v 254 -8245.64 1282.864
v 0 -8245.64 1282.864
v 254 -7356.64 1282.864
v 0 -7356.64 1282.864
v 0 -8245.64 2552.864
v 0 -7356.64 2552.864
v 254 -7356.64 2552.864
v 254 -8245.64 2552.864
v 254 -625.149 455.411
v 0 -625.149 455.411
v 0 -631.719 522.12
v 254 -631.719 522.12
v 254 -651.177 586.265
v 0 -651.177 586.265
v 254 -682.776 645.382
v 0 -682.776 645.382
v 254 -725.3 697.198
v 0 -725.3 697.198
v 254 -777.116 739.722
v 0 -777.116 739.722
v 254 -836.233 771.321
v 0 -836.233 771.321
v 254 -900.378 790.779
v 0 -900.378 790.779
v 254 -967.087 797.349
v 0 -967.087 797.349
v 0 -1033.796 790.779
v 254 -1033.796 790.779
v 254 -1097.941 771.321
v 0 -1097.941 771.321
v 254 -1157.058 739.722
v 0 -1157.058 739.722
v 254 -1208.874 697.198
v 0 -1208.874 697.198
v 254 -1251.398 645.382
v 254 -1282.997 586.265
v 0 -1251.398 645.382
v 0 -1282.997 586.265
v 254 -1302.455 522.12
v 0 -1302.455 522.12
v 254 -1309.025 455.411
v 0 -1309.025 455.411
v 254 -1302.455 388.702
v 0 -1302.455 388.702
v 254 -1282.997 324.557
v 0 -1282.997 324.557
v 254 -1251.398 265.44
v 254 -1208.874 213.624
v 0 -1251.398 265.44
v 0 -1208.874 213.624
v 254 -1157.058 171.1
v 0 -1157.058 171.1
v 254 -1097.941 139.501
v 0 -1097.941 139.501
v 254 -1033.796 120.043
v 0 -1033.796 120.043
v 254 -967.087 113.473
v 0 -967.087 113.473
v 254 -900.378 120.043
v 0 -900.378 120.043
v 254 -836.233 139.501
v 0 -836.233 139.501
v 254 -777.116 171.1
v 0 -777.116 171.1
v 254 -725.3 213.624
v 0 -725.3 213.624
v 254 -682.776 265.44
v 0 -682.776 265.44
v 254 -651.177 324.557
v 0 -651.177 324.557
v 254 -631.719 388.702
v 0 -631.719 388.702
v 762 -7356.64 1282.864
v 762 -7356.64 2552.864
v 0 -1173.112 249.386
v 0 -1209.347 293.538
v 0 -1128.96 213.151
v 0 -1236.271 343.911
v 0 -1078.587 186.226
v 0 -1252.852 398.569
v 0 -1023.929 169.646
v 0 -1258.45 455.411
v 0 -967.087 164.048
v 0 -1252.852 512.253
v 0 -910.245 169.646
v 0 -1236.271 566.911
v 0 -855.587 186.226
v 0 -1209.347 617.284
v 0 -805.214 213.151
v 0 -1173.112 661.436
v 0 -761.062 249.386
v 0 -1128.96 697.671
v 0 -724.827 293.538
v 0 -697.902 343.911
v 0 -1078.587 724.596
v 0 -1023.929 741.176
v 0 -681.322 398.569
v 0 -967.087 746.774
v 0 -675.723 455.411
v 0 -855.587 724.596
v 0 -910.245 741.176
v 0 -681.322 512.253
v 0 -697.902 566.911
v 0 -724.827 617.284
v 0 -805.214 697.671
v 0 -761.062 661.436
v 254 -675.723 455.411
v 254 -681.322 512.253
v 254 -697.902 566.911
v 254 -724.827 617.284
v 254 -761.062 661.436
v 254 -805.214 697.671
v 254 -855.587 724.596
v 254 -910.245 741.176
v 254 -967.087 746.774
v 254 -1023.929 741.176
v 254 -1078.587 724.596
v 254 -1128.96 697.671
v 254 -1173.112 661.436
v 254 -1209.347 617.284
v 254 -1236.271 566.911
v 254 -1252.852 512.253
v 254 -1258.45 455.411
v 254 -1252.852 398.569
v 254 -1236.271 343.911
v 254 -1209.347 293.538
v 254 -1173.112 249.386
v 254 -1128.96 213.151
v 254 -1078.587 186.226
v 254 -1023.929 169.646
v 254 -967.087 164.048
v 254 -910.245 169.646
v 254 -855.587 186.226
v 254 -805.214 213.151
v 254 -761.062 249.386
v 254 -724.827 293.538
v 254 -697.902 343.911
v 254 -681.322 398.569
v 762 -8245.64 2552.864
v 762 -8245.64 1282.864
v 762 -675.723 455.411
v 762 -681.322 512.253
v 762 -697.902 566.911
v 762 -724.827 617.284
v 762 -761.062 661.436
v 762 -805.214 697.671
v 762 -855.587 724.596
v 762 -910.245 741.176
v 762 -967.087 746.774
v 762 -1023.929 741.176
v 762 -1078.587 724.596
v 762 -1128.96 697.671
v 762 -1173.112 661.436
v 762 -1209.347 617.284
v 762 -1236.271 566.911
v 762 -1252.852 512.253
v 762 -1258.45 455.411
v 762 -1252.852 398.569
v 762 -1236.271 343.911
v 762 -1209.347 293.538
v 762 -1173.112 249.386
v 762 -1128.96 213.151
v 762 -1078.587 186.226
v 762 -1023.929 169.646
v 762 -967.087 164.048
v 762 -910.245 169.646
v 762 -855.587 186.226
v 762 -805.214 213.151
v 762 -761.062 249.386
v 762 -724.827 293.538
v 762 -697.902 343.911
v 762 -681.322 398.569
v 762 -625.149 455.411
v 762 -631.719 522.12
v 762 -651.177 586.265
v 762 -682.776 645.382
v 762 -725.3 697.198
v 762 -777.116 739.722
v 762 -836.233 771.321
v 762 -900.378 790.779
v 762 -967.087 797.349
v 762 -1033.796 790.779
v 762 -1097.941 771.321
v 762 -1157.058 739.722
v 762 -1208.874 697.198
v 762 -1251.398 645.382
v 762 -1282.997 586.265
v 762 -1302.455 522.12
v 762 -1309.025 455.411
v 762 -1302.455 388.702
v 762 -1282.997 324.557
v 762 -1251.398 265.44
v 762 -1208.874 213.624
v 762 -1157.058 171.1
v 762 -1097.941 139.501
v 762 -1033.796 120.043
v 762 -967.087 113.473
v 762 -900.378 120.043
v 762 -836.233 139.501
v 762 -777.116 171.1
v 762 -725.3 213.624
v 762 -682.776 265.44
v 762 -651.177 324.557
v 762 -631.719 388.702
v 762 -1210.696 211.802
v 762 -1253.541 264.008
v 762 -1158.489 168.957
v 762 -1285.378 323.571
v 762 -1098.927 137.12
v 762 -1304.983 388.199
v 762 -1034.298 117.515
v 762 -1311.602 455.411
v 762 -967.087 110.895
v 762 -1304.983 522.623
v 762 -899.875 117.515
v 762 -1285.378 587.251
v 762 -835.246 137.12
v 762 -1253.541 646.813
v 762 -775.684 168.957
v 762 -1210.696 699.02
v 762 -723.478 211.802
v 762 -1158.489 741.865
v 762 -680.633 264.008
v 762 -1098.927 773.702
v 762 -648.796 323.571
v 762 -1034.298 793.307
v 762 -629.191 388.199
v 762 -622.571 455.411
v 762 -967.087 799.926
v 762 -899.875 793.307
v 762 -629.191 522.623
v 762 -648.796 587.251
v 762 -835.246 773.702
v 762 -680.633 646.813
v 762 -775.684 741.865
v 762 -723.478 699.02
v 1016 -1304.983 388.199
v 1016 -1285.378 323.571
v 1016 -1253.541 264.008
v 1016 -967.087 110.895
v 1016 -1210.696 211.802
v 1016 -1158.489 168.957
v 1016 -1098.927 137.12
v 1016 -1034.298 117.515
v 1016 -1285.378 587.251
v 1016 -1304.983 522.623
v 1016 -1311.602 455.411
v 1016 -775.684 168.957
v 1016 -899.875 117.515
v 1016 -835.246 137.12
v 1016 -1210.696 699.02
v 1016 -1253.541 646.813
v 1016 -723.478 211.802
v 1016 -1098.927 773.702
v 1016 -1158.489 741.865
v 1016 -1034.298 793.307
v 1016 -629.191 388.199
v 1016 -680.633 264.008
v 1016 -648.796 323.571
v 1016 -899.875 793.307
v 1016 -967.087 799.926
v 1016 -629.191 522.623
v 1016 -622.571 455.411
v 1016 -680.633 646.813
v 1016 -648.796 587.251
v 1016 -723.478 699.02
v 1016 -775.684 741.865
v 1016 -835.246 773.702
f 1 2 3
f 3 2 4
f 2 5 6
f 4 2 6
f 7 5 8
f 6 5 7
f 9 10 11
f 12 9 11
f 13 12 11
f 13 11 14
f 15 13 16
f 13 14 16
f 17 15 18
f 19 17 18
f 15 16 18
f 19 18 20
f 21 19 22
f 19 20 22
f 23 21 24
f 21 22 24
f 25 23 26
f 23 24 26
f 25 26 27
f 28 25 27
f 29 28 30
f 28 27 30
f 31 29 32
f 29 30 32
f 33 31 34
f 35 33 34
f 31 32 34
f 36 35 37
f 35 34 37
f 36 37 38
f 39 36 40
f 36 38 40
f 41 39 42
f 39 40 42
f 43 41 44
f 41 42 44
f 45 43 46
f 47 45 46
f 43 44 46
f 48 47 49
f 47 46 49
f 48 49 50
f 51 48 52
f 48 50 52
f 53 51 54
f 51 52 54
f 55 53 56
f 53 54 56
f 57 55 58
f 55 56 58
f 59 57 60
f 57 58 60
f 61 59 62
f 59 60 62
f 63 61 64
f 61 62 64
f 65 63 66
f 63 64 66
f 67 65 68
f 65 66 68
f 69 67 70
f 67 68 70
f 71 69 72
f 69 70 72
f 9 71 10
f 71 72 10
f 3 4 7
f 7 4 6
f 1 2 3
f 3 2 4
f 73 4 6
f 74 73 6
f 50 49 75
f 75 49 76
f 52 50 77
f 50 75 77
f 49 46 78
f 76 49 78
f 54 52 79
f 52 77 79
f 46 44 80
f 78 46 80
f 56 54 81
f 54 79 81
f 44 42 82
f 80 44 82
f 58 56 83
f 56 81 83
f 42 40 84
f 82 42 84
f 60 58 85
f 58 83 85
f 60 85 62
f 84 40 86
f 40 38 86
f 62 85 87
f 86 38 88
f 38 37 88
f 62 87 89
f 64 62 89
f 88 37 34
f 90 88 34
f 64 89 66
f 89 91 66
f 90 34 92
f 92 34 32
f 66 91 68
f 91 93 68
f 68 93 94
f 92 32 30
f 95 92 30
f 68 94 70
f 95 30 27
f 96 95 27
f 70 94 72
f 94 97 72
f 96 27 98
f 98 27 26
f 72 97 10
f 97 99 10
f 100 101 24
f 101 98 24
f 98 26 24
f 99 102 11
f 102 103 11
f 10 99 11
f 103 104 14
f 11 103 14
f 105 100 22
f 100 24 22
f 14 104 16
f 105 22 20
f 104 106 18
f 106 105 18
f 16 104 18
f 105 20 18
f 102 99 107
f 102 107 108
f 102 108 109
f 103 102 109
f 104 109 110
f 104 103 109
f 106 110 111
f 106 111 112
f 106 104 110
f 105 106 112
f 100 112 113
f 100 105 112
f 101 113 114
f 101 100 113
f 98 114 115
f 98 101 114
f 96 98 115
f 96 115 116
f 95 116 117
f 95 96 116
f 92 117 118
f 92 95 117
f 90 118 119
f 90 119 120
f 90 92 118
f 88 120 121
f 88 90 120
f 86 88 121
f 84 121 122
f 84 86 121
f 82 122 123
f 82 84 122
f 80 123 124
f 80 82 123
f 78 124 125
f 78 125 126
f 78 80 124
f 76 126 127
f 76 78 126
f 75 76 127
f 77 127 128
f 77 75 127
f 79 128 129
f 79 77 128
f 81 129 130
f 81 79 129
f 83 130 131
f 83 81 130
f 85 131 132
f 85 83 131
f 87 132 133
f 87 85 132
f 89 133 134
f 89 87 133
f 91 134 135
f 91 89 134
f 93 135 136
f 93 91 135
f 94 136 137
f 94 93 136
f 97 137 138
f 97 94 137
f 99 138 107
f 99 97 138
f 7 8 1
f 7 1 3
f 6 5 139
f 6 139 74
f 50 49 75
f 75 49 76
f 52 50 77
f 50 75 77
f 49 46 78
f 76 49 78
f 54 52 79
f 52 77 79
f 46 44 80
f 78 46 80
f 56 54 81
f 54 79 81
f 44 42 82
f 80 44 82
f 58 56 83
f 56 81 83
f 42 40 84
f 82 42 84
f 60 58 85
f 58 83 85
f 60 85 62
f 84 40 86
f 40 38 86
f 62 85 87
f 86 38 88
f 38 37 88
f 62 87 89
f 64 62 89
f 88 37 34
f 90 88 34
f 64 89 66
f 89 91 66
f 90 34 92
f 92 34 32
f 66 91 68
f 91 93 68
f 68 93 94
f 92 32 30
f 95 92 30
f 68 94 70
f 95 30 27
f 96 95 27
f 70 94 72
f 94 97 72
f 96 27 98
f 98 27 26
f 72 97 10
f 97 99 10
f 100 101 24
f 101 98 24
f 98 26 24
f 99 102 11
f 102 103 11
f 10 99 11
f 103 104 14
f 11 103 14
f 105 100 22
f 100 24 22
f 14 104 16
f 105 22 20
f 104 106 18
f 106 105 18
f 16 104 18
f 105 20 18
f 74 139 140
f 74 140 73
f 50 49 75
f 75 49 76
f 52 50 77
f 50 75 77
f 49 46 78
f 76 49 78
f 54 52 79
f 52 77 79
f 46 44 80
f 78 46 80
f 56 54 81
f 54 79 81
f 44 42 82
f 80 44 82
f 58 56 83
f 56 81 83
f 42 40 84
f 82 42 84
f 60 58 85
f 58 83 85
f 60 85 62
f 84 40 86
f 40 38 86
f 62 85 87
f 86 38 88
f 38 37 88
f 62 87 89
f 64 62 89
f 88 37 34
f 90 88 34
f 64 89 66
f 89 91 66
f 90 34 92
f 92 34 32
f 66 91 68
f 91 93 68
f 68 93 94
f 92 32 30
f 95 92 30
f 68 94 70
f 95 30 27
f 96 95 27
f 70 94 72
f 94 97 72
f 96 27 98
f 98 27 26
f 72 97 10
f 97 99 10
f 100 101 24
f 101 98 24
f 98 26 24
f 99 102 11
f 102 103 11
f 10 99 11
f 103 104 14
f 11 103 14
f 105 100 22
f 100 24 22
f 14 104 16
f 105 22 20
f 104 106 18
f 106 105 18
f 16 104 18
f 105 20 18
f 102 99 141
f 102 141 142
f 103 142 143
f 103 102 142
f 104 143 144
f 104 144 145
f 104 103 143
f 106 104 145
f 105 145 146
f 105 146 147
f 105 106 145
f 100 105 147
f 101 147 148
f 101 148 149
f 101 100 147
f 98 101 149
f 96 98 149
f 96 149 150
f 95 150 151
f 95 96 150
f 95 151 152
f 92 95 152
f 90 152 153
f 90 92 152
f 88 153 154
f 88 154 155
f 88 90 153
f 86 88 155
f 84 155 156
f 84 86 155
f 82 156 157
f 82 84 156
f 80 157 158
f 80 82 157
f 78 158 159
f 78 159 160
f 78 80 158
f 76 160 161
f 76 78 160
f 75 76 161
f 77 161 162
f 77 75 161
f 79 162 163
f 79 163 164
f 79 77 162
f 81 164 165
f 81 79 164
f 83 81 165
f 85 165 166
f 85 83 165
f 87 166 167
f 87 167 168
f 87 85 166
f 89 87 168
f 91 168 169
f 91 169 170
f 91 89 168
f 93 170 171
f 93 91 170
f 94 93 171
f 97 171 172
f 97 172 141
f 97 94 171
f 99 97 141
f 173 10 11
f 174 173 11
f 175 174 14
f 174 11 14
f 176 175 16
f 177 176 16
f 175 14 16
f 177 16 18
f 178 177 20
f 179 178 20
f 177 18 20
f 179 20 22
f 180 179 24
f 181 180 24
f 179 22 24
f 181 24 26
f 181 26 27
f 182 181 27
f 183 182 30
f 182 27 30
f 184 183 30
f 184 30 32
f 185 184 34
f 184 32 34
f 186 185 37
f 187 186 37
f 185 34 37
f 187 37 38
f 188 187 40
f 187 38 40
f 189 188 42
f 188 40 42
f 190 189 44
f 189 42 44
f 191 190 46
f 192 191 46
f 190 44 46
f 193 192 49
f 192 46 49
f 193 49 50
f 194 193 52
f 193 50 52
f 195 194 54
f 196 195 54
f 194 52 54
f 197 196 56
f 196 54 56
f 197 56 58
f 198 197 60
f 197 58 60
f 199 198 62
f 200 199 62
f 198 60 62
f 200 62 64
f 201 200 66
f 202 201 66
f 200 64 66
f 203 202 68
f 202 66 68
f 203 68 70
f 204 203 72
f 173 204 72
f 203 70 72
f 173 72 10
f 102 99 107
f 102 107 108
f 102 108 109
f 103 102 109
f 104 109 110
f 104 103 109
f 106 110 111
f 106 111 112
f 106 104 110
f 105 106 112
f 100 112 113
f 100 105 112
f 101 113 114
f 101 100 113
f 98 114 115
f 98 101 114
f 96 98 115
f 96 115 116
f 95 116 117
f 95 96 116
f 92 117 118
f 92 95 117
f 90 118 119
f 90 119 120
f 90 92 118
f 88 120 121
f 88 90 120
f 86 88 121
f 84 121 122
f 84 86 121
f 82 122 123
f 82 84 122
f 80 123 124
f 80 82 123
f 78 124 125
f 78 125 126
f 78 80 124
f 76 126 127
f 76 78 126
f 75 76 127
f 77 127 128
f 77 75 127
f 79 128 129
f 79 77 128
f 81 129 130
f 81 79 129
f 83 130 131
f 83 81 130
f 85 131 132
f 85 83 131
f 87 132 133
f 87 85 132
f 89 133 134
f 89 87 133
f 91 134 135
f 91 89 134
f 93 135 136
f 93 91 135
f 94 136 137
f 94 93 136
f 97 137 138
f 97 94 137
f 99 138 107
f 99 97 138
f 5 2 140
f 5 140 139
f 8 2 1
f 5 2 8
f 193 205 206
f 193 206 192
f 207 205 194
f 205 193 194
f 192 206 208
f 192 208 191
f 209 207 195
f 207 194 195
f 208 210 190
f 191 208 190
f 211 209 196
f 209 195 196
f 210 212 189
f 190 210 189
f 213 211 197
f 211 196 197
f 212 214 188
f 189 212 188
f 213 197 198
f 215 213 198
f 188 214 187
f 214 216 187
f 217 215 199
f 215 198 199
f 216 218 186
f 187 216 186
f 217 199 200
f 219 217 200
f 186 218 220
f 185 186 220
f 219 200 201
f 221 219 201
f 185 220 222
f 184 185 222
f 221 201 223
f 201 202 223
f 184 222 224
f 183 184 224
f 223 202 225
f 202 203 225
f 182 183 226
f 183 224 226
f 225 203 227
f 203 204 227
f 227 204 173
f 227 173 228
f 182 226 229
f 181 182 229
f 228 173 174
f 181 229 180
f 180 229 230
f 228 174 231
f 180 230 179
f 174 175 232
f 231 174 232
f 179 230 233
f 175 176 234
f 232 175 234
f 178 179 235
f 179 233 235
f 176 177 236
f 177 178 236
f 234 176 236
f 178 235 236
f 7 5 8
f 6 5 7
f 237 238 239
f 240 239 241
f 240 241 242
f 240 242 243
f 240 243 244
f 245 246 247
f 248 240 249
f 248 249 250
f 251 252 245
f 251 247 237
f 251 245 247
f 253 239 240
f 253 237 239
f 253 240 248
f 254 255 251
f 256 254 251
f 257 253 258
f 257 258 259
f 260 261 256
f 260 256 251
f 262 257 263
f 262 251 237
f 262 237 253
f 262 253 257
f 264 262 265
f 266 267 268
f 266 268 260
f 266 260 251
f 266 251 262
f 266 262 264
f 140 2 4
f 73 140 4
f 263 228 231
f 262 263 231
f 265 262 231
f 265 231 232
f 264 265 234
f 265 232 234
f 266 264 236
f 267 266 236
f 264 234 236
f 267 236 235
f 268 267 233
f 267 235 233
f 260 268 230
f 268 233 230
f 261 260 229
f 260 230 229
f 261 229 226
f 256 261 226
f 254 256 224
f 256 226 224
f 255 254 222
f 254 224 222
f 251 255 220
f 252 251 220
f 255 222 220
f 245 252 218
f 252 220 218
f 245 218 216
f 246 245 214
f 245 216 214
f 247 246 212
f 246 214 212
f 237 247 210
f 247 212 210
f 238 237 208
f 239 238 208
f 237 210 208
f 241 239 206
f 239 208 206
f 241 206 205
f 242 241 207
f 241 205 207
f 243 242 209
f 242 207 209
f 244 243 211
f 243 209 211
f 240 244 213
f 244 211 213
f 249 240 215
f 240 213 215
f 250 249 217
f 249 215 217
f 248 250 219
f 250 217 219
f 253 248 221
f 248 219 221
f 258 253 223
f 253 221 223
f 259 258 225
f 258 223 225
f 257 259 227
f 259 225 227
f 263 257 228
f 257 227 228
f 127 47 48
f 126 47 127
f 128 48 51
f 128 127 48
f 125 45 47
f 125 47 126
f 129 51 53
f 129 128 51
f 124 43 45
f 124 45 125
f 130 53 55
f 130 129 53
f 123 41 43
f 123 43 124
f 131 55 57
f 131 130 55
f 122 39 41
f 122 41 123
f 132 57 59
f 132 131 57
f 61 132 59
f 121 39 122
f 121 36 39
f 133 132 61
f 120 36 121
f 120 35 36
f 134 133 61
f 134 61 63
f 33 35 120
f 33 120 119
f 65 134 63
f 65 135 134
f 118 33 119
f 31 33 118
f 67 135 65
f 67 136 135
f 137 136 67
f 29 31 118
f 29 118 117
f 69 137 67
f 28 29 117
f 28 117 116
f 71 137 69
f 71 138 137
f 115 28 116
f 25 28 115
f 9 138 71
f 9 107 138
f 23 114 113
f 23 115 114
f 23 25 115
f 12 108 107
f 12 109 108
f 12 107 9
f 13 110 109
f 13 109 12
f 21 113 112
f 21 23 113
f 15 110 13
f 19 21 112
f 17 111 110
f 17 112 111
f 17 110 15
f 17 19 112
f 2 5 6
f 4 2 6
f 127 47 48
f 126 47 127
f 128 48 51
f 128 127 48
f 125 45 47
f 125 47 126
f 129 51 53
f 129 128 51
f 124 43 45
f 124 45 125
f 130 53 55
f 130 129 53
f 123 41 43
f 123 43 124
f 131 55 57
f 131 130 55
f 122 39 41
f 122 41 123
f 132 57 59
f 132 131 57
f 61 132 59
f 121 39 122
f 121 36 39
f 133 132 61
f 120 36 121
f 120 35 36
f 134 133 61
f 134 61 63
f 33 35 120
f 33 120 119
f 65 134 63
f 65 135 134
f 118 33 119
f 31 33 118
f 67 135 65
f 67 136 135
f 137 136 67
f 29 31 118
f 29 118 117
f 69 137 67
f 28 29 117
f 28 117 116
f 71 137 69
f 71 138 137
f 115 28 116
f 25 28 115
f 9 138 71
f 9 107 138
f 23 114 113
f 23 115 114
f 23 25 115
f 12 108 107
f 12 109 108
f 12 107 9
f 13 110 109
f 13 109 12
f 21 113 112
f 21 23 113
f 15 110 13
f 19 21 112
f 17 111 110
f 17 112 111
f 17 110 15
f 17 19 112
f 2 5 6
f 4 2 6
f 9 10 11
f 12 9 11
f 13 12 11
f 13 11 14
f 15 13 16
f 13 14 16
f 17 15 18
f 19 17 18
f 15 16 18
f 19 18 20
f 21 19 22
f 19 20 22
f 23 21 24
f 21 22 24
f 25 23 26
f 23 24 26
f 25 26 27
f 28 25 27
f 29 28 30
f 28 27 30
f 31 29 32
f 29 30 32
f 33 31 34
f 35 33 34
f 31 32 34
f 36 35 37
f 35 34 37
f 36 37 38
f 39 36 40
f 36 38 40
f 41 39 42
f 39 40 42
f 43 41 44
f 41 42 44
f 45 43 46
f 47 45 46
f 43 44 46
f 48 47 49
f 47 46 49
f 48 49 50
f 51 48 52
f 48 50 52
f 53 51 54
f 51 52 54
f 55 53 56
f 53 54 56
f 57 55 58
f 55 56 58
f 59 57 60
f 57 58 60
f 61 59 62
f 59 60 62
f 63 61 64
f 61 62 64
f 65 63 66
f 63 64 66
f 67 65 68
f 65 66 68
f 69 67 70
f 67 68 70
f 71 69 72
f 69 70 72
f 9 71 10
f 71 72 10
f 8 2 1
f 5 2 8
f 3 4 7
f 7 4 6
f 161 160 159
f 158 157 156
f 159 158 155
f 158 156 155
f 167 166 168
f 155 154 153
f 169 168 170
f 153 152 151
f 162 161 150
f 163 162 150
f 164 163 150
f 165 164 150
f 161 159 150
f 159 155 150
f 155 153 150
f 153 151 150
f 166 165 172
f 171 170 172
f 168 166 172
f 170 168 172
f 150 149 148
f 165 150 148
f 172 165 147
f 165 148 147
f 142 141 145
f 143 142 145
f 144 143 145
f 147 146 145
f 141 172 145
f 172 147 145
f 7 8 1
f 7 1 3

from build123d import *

# Parameters (mm, degrees)
F0_W     = 889
F0_H     = 1270
F0_R     = 341.938253
F0_R_2   = 291.363355
F1_DEPTH = 254
F2_DEPTH = 254
F3_DEPTH = 762
F4_R     = 344.515494
F5_DEPTH = 254


with BuildPart() as f1:
    # F0 (on Right) → F1 (new body)
    with BuildSketch(Plane.YZ):
        with Locations((-7801.139801, 1917.864451)):
            Rectangle(F0_W, F0_H)
        with Locations((-967.086792, 455.410928)):
            Circle(F0_R)
        with Locations((-967.086792, 455.410928)):
            Circle(F0_R_2, mode=Mode.SUBTRACT)
    extrude(amount=F1_DEPTH)


with BuildPart() as f2:
    # F0 (on Right) → F2 (new body)
    with BuildSketch(Plane.YZ):
        with Locations((-7801.139801, 1917.864451)):
            Rectangle(F0_W, F0_H)
        with Locations((-967.086792, 455.410928)):
            Circle(F0_R)
        with Locations((-967.086792, 455.410928)):
            Circle(F0_R_2, mode=Mode.SUBTRACT)
    extrude(amount=F2_DEPTH)


with BuildPart() as f3:
    # F0 (on Right) → F3 (new body)
    with BuildSketch(Plane.YZ):
        with Locations((-7801.139801, 1917.864451)):
            Rectangle(F0_W, F0_H)
        with Locations((-967.086792, 455.410928)):
            Circle(F0_R)
        with Locations((-967.086792, 455.410928)):
            Circle(F0_R_2, mode=Mode.SUBTRACT)
    extrude(amount=F3_DEPTH)

    # F4 (on face) → F5 (join)
    with BuildSketch(Plane.YZ.offset(762)):
        with Locations((-967.086792, 455.410928)):
            Circle(F4_R)
    extrude(amount=F5_DEPTH)


solid = Compound([f1.part, f2.part, f3.part])
